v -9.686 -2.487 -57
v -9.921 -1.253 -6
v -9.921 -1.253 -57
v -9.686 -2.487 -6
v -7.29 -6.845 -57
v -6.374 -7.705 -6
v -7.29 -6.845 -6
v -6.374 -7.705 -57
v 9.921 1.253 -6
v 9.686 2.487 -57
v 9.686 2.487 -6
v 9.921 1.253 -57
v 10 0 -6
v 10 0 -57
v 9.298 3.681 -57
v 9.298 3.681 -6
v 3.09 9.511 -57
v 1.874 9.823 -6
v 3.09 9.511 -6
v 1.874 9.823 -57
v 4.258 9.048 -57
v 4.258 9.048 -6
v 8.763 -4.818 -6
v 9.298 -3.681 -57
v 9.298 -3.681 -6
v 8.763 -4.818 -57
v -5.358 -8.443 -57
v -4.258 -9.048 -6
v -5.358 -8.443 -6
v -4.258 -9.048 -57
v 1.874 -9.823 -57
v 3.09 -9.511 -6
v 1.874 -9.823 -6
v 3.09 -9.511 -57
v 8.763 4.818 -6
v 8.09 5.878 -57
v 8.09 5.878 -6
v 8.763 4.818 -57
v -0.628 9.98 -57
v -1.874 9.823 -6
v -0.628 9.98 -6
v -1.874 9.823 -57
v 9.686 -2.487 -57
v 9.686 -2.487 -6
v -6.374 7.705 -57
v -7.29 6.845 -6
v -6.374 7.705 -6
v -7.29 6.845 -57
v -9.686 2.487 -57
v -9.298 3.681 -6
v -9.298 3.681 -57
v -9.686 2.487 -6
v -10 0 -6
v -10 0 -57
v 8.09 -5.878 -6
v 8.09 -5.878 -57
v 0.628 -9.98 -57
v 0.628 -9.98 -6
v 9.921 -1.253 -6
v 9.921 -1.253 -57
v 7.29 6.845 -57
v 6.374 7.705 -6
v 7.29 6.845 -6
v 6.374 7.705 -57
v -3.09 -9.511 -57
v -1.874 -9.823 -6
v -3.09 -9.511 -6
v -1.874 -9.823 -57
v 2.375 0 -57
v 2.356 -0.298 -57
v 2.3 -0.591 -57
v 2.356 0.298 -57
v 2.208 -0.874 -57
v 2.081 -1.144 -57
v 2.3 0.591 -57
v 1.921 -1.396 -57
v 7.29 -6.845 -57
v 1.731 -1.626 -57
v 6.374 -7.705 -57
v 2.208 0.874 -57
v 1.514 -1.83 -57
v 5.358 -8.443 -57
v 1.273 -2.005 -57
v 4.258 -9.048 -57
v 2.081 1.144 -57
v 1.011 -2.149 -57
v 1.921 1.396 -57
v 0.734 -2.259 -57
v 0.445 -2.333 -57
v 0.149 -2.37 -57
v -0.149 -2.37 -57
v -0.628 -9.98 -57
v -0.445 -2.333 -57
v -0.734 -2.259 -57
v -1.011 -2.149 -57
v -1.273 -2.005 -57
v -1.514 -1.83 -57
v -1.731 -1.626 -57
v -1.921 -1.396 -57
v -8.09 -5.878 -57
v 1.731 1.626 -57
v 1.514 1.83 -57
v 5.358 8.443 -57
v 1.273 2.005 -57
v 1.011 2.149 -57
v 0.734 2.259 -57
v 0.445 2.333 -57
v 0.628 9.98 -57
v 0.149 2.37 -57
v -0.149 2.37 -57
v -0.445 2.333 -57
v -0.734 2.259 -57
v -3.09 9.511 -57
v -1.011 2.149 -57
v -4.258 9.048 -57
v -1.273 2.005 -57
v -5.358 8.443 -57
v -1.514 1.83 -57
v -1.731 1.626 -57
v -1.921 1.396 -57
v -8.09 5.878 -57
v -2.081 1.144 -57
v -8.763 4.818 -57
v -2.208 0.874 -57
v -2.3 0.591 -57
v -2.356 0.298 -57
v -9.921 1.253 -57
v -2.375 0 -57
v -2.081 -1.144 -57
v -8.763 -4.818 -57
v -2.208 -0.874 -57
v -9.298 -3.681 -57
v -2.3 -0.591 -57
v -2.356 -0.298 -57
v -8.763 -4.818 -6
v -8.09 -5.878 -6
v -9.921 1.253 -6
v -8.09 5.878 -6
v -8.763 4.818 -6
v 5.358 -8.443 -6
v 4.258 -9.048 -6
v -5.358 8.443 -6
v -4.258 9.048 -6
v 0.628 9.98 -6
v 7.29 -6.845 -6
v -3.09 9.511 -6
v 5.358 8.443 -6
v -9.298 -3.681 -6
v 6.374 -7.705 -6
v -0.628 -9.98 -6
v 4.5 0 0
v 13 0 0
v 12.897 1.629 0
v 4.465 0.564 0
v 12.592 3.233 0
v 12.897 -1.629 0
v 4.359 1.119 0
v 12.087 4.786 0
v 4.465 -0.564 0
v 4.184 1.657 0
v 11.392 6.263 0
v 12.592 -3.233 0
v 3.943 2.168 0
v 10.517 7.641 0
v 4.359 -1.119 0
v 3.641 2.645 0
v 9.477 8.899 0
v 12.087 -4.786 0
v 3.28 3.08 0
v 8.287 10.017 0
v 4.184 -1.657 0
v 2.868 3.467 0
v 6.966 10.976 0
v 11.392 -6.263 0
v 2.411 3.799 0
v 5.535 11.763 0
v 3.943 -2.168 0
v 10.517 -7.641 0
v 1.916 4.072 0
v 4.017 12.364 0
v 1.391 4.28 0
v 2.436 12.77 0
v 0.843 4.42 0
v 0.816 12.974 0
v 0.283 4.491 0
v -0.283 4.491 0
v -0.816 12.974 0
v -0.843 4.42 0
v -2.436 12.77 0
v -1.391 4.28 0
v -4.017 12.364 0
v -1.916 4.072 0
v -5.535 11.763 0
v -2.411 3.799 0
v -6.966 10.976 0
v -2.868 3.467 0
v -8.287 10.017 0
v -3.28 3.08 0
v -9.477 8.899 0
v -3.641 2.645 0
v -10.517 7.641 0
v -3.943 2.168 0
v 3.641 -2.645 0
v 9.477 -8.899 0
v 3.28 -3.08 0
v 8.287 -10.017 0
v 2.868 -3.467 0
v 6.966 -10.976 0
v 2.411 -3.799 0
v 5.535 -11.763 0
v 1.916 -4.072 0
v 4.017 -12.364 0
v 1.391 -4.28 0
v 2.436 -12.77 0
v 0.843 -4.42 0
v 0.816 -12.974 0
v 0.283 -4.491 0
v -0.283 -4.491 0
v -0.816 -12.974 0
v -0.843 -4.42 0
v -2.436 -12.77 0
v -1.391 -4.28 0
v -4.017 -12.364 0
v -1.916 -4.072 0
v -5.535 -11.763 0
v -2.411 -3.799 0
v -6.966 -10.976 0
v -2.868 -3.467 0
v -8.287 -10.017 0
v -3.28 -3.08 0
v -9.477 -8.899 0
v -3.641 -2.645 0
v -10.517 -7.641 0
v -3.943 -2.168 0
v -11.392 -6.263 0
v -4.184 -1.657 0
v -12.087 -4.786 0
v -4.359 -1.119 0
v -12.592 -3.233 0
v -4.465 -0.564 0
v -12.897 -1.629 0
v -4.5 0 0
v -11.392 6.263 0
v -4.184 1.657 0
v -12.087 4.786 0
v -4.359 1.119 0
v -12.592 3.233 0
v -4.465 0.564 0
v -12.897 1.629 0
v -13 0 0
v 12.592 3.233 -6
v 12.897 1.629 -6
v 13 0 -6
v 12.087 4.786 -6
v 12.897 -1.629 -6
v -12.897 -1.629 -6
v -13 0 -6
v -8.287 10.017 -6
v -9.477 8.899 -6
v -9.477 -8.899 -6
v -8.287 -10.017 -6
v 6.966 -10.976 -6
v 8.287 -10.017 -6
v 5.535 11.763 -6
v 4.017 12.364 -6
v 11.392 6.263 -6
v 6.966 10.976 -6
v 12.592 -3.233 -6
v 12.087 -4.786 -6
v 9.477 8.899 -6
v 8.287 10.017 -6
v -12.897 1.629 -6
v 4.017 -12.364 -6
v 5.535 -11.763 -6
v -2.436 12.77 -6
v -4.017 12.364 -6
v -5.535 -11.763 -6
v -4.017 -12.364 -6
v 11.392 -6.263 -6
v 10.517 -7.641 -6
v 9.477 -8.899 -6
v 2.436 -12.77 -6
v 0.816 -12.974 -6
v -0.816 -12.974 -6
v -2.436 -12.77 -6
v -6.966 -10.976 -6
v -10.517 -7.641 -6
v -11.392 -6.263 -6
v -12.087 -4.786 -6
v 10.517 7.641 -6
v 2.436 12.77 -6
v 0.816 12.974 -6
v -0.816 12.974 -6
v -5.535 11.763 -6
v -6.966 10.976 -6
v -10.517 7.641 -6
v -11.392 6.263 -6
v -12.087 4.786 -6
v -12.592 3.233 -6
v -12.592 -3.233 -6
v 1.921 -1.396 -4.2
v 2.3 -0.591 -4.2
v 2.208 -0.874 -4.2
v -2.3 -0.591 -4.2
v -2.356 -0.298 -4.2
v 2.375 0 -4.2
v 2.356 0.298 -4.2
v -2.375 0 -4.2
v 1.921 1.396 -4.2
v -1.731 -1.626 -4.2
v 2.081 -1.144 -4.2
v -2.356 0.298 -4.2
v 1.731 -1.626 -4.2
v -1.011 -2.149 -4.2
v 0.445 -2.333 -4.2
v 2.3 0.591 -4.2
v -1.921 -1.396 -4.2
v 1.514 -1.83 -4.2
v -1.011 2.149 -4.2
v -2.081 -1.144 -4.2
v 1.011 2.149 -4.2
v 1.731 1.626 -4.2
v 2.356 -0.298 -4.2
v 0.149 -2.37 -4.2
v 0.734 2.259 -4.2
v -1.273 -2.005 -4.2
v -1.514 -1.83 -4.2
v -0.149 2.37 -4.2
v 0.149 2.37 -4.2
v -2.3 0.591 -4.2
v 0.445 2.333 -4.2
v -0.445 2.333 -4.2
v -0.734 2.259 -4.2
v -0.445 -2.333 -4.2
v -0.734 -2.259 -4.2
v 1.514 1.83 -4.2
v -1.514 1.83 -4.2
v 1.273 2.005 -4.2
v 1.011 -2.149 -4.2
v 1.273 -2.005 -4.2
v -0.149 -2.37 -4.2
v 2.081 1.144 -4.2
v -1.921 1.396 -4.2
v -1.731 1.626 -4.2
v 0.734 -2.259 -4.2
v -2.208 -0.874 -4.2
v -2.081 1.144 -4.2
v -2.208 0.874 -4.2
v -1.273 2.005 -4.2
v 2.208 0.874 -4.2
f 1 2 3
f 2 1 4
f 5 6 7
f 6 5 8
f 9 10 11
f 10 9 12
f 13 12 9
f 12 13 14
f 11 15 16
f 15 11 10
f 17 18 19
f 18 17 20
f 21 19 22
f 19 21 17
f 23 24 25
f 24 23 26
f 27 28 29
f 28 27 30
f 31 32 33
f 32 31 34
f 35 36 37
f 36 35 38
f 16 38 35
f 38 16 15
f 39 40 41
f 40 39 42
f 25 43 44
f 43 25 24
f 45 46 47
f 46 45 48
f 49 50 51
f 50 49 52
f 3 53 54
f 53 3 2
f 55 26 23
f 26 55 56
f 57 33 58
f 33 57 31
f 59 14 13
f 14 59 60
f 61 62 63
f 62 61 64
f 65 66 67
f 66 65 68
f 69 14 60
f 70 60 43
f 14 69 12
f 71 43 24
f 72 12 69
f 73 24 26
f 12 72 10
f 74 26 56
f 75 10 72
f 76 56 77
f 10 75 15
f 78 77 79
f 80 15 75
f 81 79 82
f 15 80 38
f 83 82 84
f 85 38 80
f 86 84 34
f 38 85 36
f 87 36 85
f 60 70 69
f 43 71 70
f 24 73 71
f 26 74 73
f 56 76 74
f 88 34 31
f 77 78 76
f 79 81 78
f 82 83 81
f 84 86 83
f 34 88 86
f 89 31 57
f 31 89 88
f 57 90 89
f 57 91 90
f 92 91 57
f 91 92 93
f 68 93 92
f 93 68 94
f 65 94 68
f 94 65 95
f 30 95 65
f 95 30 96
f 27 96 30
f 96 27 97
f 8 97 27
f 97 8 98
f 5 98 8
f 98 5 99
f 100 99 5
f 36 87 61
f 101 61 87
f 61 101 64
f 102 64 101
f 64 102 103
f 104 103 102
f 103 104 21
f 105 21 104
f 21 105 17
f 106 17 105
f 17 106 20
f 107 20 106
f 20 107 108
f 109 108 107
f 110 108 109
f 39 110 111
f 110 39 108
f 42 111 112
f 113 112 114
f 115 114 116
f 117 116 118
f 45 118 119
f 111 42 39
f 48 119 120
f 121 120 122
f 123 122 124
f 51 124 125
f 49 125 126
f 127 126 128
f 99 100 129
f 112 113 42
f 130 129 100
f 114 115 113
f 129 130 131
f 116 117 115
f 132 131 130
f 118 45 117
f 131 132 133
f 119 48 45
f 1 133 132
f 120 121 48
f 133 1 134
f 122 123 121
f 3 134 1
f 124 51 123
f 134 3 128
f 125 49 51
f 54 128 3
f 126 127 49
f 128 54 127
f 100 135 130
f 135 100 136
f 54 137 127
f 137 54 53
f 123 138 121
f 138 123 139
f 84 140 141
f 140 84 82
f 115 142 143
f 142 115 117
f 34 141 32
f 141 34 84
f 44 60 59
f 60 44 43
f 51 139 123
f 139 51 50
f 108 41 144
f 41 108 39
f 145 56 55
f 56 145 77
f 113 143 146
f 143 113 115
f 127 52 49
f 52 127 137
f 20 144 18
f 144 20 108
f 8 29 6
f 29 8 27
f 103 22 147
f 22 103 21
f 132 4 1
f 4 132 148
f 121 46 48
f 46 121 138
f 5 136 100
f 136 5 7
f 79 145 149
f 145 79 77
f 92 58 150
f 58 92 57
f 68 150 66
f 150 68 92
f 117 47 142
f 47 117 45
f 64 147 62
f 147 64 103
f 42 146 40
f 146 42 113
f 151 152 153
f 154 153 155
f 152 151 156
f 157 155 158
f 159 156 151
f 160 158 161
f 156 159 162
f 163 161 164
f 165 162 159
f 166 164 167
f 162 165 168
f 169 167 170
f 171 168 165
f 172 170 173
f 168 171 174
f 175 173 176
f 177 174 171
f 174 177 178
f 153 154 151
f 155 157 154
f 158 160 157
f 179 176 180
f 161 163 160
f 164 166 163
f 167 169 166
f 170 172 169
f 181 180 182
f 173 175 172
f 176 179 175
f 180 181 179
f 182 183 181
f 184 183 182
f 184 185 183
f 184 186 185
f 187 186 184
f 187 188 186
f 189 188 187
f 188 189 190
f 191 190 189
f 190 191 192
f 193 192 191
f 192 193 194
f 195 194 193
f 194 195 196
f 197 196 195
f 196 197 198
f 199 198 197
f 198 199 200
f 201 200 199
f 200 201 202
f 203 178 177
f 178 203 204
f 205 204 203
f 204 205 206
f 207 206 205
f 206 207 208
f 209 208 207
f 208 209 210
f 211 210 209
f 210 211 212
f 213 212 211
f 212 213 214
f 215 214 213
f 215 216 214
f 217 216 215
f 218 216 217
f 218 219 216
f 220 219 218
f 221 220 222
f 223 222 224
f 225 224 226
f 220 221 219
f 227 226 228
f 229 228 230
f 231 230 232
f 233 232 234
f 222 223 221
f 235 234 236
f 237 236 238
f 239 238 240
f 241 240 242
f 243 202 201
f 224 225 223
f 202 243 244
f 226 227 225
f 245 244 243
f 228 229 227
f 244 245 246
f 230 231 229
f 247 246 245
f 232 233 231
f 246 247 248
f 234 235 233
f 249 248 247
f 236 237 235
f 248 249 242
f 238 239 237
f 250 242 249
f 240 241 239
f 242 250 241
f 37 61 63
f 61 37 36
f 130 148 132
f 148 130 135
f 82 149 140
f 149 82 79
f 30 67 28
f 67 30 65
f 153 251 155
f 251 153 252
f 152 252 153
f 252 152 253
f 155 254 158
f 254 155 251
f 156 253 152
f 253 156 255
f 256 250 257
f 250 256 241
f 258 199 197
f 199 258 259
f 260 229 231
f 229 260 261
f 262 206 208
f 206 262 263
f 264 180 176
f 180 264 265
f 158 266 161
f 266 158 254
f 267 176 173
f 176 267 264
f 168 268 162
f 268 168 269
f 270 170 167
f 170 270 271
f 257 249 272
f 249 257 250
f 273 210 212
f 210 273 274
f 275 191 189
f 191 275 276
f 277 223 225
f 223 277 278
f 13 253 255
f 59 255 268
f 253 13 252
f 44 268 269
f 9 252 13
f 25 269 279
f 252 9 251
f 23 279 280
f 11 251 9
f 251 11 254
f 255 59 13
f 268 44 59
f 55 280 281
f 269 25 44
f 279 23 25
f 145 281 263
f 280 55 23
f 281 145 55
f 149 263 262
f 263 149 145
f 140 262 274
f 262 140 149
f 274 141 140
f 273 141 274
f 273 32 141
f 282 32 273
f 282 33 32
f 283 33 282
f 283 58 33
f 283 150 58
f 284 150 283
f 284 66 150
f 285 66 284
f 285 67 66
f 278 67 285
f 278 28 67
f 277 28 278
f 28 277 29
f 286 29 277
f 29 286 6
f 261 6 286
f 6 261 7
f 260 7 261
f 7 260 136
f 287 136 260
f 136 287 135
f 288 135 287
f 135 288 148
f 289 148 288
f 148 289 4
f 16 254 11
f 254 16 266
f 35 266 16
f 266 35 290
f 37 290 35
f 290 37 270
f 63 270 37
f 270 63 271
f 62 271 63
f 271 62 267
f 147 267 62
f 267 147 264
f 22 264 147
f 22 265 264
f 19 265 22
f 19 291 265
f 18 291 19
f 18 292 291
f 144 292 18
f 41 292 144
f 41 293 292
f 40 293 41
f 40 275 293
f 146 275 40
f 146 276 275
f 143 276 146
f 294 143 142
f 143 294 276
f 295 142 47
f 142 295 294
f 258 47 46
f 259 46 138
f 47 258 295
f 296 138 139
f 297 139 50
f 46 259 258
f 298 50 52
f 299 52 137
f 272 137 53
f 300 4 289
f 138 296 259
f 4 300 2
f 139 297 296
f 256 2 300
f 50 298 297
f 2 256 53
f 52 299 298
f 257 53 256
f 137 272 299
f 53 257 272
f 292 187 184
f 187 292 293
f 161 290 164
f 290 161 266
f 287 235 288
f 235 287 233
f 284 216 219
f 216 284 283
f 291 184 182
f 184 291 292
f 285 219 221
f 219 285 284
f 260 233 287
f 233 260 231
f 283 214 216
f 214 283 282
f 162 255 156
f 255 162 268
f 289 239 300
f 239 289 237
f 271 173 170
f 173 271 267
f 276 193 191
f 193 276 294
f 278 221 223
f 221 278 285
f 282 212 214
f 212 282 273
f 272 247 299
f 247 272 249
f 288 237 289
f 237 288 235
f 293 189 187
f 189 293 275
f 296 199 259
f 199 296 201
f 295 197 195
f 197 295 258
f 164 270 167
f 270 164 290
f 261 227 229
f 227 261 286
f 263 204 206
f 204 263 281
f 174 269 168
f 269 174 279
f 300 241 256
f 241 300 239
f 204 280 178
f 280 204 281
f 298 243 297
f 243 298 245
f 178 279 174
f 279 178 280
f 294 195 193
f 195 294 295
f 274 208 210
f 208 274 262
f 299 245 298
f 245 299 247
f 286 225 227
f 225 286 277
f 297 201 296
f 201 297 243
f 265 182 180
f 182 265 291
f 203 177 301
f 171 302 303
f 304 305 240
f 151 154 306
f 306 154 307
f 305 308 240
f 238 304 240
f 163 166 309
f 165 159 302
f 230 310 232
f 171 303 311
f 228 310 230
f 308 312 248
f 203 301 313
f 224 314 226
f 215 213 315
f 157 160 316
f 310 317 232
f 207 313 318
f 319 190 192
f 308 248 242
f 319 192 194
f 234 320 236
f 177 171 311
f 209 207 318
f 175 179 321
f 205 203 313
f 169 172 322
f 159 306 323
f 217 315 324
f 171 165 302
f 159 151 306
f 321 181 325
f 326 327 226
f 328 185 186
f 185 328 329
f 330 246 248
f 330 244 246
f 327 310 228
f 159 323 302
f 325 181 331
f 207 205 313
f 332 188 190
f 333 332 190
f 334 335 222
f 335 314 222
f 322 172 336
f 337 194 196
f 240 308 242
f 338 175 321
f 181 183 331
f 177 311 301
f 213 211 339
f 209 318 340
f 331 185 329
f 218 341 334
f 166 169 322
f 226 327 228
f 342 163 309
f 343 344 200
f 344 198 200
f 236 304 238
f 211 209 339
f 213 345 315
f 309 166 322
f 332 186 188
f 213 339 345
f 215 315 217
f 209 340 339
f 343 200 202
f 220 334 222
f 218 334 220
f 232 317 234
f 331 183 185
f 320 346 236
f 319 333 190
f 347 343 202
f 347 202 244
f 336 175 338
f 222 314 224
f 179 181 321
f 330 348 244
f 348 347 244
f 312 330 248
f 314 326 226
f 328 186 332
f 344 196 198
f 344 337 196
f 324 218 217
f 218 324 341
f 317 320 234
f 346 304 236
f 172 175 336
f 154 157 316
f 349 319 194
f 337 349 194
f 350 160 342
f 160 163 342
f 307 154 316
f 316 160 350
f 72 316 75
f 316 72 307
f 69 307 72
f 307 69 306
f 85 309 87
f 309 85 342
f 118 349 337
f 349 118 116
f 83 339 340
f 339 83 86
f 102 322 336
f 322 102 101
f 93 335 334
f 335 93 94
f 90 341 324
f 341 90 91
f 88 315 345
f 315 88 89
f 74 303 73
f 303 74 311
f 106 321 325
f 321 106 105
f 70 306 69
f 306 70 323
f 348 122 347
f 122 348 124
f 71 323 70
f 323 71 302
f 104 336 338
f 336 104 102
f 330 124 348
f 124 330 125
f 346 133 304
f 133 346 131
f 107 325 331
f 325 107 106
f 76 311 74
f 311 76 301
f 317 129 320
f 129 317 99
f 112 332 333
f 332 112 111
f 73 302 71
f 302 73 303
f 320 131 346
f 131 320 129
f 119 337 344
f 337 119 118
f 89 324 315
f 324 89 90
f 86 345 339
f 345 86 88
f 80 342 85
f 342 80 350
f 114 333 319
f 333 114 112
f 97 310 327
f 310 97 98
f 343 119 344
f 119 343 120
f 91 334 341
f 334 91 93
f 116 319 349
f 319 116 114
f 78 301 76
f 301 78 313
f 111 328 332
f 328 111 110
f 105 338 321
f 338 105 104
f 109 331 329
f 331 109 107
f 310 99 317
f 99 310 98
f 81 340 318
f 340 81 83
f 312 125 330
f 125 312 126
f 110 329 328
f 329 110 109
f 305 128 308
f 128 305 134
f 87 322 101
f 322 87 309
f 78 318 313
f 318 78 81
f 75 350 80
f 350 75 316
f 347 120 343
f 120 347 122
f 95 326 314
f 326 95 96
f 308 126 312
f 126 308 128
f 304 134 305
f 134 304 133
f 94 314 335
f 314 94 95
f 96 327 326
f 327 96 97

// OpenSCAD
$fn = 50;


difference() {
	union() {
		translate(v = [0, 0, -57.0000000000]) {
			cylinder(h = 57, r = 10.0000000000);
		}
		translate(v = [0, 0, -6.0000000000]) {
			cylinder(h = 6, r = 13.0000000000);
		}
	}
	union() {
		translate(v = [0, 0, 0]) {
			rotate(a = [0, 0, 0]) {
				difference() {
					union() {
						#translate(v = [0, 0, -57.0000000000]) {
							cylinder(h = 57, r = 2.2500000000);
						}
						#translate(v = [0, 0, -4.2000000000]) {
							cylinder(h = 4.2000000000, r = 10.0000000000, r1 = 2.3750000000, r2 = 4.5000000000);
						}
						#translate(v = [0, 0, -57.0000000000]) {
							cylinder(h = 57, r = 2.3750000000);
						}
						#translate(v = [0, 0, -57.0000000000]) {
							cylinder(h = 57, r = 2.2500000000);
						}
					}
					union();
				}
			}
		}
	}
}
